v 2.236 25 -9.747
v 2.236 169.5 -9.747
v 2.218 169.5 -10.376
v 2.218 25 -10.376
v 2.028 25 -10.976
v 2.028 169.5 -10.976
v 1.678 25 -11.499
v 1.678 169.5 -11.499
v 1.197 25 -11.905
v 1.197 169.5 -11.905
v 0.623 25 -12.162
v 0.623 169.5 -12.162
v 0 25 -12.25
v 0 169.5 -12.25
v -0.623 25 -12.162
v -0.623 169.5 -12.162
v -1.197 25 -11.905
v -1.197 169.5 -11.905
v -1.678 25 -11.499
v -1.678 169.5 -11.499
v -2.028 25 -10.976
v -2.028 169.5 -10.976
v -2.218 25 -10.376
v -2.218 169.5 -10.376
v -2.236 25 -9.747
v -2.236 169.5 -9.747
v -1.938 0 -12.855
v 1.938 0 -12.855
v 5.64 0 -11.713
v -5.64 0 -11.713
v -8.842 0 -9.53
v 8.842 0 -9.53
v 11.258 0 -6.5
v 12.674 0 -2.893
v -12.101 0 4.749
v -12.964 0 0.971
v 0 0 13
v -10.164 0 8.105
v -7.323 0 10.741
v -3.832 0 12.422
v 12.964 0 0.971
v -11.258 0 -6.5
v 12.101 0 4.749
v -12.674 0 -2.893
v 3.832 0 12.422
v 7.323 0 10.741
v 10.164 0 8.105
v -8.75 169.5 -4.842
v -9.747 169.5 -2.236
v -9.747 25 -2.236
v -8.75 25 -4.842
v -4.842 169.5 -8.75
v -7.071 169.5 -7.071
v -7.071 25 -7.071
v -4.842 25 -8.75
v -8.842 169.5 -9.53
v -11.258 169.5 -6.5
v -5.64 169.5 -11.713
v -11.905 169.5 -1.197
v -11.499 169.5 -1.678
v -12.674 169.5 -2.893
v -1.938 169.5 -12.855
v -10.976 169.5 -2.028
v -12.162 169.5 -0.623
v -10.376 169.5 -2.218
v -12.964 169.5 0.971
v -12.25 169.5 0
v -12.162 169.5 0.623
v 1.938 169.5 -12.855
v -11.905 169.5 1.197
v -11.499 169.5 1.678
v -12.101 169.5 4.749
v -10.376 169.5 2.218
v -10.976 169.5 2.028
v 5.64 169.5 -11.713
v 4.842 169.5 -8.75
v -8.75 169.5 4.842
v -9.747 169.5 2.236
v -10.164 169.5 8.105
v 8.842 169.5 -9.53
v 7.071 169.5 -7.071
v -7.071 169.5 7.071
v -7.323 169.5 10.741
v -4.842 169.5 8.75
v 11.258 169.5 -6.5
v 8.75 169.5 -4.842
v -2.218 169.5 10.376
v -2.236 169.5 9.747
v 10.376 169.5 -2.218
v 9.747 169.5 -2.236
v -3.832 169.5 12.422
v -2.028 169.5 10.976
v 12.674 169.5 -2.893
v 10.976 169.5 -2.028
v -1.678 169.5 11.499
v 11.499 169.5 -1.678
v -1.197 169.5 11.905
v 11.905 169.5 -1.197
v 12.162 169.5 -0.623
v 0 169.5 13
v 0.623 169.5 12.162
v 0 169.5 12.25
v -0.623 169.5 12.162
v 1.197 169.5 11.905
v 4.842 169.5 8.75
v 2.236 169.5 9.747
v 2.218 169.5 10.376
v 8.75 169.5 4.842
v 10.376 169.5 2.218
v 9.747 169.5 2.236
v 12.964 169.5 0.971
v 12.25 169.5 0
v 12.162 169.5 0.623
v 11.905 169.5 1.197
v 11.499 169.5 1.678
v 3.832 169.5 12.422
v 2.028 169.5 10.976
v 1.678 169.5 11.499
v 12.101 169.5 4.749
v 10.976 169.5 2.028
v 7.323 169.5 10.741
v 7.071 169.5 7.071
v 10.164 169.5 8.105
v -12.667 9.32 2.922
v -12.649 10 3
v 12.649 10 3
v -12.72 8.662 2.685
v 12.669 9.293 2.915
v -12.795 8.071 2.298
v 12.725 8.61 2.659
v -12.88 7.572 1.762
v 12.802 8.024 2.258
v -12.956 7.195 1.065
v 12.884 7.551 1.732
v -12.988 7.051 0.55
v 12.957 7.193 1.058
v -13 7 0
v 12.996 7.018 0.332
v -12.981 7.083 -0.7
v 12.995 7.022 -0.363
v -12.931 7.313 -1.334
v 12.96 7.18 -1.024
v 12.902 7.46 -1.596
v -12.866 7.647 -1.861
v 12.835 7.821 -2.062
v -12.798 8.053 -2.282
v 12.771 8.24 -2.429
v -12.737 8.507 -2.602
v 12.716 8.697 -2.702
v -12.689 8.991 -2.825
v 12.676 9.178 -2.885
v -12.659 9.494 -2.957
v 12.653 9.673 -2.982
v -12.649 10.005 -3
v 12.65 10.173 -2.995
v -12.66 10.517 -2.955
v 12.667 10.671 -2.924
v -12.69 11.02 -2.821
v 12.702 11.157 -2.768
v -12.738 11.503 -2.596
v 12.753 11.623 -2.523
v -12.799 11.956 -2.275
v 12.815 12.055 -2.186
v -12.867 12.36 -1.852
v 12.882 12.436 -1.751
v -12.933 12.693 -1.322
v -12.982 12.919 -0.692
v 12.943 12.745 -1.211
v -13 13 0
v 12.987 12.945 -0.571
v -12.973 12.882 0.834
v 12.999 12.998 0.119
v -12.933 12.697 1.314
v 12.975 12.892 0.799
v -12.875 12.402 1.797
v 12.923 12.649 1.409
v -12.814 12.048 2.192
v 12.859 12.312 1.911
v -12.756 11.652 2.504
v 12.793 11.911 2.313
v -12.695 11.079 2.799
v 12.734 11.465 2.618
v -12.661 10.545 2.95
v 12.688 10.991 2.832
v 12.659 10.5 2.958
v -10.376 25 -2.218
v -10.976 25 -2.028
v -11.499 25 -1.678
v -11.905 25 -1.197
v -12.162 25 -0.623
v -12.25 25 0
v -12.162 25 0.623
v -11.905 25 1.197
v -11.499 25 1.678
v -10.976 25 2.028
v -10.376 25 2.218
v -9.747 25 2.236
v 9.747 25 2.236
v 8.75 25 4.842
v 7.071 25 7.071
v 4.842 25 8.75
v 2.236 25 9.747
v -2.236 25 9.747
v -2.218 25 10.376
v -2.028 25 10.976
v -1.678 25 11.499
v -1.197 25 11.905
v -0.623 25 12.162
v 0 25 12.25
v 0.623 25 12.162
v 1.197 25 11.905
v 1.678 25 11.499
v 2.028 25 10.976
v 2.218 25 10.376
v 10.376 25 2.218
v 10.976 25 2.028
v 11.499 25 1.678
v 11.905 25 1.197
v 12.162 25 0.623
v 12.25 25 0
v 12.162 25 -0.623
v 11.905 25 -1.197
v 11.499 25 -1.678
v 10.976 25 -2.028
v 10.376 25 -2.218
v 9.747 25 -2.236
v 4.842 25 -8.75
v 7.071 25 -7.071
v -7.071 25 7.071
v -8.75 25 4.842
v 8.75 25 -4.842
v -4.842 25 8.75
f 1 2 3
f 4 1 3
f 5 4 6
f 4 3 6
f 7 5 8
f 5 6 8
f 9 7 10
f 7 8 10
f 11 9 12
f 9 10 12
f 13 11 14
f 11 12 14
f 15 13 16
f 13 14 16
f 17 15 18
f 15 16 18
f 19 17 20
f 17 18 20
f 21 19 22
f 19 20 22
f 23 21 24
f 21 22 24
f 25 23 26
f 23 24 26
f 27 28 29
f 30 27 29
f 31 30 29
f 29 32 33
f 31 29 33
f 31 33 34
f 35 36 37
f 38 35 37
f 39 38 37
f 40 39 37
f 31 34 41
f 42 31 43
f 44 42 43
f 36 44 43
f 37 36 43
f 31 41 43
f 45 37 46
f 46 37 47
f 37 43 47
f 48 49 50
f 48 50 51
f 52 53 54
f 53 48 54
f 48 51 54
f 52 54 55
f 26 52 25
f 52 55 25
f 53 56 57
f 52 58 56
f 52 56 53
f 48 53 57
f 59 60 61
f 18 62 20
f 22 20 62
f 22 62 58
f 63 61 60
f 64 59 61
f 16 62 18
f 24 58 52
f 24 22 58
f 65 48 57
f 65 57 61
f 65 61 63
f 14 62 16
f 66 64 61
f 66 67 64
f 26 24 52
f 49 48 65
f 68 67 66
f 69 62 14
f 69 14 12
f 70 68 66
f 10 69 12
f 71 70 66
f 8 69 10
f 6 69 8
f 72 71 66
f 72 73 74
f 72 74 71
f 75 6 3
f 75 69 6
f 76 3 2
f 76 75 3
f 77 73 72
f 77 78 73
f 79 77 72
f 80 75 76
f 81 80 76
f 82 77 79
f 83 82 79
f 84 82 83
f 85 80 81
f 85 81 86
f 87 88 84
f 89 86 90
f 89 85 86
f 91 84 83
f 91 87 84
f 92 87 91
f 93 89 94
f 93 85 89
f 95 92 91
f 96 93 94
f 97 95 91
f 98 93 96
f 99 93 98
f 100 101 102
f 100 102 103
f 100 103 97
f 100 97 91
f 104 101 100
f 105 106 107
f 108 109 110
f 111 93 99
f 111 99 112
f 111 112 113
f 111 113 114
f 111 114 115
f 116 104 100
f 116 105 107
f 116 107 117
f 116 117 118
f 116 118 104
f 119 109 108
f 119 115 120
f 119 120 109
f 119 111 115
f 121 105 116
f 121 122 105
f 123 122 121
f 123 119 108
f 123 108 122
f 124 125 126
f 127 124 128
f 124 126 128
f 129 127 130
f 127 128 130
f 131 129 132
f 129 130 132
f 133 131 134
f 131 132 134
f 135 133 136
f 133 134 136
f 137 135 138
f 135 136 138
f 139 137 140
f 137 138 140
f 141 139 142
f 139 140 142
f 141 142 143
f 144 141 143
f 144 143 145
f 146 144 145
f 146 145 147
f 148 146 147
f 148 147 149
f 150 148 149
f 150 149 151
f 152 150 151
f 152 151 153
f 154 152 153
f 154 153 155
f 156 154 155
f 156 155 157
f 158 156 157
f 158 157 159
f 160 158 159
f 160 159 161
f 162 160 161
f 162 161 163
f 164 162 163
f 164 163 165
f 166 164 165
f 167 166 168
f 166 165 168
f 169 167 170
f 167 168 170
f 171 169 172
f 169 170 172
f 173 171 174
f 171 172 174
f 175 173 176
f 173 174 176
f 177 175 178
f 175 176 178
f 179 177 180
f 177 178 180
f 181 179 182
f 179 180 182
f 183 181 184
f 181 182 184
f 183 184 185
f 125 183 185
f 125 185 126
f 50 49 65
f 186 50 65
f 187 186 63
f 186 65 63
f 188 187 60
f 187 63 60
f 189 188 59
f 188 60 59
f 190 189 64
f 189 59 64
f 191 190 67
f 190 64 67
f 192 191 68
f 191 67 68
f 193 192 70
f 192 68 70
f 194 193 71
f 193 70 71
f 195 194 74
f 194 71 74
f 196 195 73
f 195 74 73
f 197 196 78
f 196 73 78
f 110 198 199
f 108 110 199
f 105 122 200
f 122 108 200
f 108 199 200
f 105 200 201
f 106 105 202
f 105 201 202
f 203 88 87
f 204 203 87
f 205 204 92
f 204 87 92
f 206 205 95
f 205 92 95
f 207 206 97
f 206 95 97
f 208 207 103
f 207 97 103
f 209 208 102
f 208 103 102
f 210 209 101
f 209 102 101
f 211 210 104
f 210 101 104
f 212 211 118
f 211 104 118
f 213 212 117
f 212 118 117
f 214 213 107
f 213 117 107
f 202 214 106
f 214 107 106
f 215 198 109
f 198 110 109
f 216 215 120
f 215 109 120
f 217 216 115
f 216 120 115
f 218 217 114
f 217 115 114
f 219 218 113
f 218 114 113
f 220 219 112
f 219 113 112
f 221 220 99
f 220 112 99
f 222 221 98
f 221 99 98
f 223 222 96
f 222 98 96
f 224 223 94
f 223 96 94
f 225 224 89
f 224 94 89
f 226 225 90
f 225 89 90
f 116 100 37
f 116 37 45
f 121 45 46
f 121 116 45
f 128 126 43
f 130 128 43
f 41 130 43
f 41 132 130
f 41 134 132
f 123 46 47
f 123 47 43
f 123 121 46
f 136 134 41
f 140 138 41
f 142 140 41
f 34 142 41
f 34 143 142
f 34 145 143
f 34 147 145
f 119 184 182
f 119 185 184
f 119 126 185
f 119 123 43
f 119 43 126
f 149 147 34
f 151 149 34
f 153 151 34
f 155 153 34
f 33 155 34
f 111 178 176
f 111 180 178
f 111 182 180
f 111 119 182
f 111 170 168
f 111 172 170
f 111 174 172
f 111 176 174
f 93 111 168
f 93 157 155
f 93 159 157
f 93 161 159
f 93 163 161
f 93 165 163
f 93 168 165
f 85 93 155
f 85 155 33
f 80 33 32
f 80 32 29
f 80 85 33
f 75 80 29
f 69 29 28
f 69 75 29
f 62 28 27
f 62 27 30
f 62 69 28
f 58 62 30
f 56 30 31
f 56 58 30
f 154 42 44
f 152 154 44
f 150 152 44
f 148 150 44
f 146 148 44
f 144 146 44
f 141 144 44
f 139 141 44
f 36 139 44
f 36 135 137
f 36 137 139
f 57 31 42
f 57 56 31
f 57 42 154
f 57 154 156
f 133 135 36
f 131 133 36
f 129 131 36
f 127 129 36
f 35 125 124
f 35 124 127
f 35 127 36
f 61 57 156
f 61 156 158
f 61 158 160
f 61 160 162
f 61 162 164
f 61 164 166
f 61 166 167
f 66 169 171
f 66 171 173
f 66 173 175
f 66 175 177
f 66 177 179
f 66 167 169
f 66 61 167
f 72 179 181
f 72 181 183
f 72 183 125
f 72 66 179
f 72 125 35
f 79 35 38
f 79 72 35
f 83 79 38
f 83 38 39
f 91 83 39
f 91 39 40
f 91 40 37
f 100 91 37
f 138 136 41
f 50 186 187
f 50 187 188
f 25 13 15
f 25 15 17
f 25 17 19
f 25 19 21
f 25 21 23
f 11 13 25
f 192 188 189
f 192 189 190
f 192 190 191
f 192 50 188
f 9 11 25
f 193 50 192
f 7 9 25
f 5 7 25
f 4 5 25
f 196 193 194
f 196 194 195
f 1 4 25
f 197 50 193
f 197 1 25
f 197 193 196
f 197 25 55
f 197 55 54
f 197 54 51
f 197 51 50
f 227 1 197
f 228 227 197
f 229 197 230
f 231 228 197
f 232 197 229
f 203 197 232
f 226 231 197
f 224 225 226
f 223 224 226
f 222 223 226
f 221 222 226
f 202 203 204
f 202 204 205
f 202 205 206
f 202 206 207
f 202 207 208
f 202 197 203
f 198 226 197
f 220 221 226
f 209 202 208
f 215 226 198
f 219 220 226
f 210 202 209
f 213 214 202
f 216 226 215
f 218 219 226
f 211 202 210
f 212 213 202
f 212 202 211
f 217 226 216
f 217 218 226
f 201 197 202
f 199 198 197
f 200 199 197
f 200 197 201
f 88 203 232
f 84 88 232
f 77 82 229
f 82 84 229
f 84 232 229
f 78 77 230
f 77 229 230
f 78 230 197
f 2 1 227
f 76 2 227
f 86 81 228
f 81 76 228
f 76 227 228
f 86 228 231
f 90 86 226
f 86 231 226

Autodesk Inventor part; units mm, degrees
ref_plane "XZ Plane" through (0, 0, 0) normal (0, 1, 0) x (-1, 0, 0)
ref_plane "XY Plane" through (0, 0, 0) normal (0, 0, 1) x (1, 0, 0)
sketch "Sketch3" plane through (0, 0, 0) normal (1, 0, 0) x (0, 1, 0)
  line L0 (0, -2.6) -> (0, 15.6) projected
  line L1 (-33.9, 0) -> (203.4, 0) projected
  line L2 (0, 13) -> (169.5, 13)
  line L3 (169.5, 13) -> (169.5, 10)
  line L4 (169.5, 10) -> (25, 10)
  line L5 (25, 10) -> (25, 0)
  line L6 (0, 13) -> (0, 0)
  line L7 (25, 0) -> (0, 0)
  point P0 (0, 13)
  dimension "d10" = 169.5
  dimension "d13" = 10
  dimension "d14" = 13
  dimension "d15" = 25
  dimension "d17" = 3
revolve "Revolution1" add sketch "Sketch3" angle 360 about axis through (0, -10, 0) along (0, 1, 0)
ref_plane "Work Plane1" through (-13, 84.75, 0) normal (1, 0, 0) x (0, 1, 0)
sketch "Sketch4" plane through (-13, 84.75, 0) normal (1, 0, 0) x (0, 1, 0)
  line L0 (-84.75, -13) -> (-84.75, 13) projected
  line L1 (-118.65, 0) -> (118.65, 0) projected
  point P0 (-84.75, 0)
  point P1 (-74.75, 0)
  dimension "d18" = 10
hole "Hole1" at (-13, 10, 0) direction (1, 0, 0) diameter 6 end through all
sketch "Sketch5" plane through (0, 169.5, 0) normal (0, 1, 0) x (1, 0, 0)
  circle A0 centre (0, 0) radius 10 projected
  circle A1 centre (0, -10) radius 2.25
  line L0 (0, 18.2) -> (0, -18.2) projected
  point P0 (2.2357, -9.7469)
  point P1 (-2.2357, -9.7469)
  dimension "d26" = 4.5
extrude "Extrusion3" cut sketch "Sketch5" against normal up to surface (144.5 mm away) contours A1 L0 A0 | A0 L0 A1 picked at (0.5757, -10.6663) picked at (-0.5973, -10.6555)
pattern_circular "Circular Pattern1" count 4 over 360 about axis through (0, 97.25, 0) along (0, 1, 0) of "Extrusion3"
properties part number "Soporte de Marcador"
